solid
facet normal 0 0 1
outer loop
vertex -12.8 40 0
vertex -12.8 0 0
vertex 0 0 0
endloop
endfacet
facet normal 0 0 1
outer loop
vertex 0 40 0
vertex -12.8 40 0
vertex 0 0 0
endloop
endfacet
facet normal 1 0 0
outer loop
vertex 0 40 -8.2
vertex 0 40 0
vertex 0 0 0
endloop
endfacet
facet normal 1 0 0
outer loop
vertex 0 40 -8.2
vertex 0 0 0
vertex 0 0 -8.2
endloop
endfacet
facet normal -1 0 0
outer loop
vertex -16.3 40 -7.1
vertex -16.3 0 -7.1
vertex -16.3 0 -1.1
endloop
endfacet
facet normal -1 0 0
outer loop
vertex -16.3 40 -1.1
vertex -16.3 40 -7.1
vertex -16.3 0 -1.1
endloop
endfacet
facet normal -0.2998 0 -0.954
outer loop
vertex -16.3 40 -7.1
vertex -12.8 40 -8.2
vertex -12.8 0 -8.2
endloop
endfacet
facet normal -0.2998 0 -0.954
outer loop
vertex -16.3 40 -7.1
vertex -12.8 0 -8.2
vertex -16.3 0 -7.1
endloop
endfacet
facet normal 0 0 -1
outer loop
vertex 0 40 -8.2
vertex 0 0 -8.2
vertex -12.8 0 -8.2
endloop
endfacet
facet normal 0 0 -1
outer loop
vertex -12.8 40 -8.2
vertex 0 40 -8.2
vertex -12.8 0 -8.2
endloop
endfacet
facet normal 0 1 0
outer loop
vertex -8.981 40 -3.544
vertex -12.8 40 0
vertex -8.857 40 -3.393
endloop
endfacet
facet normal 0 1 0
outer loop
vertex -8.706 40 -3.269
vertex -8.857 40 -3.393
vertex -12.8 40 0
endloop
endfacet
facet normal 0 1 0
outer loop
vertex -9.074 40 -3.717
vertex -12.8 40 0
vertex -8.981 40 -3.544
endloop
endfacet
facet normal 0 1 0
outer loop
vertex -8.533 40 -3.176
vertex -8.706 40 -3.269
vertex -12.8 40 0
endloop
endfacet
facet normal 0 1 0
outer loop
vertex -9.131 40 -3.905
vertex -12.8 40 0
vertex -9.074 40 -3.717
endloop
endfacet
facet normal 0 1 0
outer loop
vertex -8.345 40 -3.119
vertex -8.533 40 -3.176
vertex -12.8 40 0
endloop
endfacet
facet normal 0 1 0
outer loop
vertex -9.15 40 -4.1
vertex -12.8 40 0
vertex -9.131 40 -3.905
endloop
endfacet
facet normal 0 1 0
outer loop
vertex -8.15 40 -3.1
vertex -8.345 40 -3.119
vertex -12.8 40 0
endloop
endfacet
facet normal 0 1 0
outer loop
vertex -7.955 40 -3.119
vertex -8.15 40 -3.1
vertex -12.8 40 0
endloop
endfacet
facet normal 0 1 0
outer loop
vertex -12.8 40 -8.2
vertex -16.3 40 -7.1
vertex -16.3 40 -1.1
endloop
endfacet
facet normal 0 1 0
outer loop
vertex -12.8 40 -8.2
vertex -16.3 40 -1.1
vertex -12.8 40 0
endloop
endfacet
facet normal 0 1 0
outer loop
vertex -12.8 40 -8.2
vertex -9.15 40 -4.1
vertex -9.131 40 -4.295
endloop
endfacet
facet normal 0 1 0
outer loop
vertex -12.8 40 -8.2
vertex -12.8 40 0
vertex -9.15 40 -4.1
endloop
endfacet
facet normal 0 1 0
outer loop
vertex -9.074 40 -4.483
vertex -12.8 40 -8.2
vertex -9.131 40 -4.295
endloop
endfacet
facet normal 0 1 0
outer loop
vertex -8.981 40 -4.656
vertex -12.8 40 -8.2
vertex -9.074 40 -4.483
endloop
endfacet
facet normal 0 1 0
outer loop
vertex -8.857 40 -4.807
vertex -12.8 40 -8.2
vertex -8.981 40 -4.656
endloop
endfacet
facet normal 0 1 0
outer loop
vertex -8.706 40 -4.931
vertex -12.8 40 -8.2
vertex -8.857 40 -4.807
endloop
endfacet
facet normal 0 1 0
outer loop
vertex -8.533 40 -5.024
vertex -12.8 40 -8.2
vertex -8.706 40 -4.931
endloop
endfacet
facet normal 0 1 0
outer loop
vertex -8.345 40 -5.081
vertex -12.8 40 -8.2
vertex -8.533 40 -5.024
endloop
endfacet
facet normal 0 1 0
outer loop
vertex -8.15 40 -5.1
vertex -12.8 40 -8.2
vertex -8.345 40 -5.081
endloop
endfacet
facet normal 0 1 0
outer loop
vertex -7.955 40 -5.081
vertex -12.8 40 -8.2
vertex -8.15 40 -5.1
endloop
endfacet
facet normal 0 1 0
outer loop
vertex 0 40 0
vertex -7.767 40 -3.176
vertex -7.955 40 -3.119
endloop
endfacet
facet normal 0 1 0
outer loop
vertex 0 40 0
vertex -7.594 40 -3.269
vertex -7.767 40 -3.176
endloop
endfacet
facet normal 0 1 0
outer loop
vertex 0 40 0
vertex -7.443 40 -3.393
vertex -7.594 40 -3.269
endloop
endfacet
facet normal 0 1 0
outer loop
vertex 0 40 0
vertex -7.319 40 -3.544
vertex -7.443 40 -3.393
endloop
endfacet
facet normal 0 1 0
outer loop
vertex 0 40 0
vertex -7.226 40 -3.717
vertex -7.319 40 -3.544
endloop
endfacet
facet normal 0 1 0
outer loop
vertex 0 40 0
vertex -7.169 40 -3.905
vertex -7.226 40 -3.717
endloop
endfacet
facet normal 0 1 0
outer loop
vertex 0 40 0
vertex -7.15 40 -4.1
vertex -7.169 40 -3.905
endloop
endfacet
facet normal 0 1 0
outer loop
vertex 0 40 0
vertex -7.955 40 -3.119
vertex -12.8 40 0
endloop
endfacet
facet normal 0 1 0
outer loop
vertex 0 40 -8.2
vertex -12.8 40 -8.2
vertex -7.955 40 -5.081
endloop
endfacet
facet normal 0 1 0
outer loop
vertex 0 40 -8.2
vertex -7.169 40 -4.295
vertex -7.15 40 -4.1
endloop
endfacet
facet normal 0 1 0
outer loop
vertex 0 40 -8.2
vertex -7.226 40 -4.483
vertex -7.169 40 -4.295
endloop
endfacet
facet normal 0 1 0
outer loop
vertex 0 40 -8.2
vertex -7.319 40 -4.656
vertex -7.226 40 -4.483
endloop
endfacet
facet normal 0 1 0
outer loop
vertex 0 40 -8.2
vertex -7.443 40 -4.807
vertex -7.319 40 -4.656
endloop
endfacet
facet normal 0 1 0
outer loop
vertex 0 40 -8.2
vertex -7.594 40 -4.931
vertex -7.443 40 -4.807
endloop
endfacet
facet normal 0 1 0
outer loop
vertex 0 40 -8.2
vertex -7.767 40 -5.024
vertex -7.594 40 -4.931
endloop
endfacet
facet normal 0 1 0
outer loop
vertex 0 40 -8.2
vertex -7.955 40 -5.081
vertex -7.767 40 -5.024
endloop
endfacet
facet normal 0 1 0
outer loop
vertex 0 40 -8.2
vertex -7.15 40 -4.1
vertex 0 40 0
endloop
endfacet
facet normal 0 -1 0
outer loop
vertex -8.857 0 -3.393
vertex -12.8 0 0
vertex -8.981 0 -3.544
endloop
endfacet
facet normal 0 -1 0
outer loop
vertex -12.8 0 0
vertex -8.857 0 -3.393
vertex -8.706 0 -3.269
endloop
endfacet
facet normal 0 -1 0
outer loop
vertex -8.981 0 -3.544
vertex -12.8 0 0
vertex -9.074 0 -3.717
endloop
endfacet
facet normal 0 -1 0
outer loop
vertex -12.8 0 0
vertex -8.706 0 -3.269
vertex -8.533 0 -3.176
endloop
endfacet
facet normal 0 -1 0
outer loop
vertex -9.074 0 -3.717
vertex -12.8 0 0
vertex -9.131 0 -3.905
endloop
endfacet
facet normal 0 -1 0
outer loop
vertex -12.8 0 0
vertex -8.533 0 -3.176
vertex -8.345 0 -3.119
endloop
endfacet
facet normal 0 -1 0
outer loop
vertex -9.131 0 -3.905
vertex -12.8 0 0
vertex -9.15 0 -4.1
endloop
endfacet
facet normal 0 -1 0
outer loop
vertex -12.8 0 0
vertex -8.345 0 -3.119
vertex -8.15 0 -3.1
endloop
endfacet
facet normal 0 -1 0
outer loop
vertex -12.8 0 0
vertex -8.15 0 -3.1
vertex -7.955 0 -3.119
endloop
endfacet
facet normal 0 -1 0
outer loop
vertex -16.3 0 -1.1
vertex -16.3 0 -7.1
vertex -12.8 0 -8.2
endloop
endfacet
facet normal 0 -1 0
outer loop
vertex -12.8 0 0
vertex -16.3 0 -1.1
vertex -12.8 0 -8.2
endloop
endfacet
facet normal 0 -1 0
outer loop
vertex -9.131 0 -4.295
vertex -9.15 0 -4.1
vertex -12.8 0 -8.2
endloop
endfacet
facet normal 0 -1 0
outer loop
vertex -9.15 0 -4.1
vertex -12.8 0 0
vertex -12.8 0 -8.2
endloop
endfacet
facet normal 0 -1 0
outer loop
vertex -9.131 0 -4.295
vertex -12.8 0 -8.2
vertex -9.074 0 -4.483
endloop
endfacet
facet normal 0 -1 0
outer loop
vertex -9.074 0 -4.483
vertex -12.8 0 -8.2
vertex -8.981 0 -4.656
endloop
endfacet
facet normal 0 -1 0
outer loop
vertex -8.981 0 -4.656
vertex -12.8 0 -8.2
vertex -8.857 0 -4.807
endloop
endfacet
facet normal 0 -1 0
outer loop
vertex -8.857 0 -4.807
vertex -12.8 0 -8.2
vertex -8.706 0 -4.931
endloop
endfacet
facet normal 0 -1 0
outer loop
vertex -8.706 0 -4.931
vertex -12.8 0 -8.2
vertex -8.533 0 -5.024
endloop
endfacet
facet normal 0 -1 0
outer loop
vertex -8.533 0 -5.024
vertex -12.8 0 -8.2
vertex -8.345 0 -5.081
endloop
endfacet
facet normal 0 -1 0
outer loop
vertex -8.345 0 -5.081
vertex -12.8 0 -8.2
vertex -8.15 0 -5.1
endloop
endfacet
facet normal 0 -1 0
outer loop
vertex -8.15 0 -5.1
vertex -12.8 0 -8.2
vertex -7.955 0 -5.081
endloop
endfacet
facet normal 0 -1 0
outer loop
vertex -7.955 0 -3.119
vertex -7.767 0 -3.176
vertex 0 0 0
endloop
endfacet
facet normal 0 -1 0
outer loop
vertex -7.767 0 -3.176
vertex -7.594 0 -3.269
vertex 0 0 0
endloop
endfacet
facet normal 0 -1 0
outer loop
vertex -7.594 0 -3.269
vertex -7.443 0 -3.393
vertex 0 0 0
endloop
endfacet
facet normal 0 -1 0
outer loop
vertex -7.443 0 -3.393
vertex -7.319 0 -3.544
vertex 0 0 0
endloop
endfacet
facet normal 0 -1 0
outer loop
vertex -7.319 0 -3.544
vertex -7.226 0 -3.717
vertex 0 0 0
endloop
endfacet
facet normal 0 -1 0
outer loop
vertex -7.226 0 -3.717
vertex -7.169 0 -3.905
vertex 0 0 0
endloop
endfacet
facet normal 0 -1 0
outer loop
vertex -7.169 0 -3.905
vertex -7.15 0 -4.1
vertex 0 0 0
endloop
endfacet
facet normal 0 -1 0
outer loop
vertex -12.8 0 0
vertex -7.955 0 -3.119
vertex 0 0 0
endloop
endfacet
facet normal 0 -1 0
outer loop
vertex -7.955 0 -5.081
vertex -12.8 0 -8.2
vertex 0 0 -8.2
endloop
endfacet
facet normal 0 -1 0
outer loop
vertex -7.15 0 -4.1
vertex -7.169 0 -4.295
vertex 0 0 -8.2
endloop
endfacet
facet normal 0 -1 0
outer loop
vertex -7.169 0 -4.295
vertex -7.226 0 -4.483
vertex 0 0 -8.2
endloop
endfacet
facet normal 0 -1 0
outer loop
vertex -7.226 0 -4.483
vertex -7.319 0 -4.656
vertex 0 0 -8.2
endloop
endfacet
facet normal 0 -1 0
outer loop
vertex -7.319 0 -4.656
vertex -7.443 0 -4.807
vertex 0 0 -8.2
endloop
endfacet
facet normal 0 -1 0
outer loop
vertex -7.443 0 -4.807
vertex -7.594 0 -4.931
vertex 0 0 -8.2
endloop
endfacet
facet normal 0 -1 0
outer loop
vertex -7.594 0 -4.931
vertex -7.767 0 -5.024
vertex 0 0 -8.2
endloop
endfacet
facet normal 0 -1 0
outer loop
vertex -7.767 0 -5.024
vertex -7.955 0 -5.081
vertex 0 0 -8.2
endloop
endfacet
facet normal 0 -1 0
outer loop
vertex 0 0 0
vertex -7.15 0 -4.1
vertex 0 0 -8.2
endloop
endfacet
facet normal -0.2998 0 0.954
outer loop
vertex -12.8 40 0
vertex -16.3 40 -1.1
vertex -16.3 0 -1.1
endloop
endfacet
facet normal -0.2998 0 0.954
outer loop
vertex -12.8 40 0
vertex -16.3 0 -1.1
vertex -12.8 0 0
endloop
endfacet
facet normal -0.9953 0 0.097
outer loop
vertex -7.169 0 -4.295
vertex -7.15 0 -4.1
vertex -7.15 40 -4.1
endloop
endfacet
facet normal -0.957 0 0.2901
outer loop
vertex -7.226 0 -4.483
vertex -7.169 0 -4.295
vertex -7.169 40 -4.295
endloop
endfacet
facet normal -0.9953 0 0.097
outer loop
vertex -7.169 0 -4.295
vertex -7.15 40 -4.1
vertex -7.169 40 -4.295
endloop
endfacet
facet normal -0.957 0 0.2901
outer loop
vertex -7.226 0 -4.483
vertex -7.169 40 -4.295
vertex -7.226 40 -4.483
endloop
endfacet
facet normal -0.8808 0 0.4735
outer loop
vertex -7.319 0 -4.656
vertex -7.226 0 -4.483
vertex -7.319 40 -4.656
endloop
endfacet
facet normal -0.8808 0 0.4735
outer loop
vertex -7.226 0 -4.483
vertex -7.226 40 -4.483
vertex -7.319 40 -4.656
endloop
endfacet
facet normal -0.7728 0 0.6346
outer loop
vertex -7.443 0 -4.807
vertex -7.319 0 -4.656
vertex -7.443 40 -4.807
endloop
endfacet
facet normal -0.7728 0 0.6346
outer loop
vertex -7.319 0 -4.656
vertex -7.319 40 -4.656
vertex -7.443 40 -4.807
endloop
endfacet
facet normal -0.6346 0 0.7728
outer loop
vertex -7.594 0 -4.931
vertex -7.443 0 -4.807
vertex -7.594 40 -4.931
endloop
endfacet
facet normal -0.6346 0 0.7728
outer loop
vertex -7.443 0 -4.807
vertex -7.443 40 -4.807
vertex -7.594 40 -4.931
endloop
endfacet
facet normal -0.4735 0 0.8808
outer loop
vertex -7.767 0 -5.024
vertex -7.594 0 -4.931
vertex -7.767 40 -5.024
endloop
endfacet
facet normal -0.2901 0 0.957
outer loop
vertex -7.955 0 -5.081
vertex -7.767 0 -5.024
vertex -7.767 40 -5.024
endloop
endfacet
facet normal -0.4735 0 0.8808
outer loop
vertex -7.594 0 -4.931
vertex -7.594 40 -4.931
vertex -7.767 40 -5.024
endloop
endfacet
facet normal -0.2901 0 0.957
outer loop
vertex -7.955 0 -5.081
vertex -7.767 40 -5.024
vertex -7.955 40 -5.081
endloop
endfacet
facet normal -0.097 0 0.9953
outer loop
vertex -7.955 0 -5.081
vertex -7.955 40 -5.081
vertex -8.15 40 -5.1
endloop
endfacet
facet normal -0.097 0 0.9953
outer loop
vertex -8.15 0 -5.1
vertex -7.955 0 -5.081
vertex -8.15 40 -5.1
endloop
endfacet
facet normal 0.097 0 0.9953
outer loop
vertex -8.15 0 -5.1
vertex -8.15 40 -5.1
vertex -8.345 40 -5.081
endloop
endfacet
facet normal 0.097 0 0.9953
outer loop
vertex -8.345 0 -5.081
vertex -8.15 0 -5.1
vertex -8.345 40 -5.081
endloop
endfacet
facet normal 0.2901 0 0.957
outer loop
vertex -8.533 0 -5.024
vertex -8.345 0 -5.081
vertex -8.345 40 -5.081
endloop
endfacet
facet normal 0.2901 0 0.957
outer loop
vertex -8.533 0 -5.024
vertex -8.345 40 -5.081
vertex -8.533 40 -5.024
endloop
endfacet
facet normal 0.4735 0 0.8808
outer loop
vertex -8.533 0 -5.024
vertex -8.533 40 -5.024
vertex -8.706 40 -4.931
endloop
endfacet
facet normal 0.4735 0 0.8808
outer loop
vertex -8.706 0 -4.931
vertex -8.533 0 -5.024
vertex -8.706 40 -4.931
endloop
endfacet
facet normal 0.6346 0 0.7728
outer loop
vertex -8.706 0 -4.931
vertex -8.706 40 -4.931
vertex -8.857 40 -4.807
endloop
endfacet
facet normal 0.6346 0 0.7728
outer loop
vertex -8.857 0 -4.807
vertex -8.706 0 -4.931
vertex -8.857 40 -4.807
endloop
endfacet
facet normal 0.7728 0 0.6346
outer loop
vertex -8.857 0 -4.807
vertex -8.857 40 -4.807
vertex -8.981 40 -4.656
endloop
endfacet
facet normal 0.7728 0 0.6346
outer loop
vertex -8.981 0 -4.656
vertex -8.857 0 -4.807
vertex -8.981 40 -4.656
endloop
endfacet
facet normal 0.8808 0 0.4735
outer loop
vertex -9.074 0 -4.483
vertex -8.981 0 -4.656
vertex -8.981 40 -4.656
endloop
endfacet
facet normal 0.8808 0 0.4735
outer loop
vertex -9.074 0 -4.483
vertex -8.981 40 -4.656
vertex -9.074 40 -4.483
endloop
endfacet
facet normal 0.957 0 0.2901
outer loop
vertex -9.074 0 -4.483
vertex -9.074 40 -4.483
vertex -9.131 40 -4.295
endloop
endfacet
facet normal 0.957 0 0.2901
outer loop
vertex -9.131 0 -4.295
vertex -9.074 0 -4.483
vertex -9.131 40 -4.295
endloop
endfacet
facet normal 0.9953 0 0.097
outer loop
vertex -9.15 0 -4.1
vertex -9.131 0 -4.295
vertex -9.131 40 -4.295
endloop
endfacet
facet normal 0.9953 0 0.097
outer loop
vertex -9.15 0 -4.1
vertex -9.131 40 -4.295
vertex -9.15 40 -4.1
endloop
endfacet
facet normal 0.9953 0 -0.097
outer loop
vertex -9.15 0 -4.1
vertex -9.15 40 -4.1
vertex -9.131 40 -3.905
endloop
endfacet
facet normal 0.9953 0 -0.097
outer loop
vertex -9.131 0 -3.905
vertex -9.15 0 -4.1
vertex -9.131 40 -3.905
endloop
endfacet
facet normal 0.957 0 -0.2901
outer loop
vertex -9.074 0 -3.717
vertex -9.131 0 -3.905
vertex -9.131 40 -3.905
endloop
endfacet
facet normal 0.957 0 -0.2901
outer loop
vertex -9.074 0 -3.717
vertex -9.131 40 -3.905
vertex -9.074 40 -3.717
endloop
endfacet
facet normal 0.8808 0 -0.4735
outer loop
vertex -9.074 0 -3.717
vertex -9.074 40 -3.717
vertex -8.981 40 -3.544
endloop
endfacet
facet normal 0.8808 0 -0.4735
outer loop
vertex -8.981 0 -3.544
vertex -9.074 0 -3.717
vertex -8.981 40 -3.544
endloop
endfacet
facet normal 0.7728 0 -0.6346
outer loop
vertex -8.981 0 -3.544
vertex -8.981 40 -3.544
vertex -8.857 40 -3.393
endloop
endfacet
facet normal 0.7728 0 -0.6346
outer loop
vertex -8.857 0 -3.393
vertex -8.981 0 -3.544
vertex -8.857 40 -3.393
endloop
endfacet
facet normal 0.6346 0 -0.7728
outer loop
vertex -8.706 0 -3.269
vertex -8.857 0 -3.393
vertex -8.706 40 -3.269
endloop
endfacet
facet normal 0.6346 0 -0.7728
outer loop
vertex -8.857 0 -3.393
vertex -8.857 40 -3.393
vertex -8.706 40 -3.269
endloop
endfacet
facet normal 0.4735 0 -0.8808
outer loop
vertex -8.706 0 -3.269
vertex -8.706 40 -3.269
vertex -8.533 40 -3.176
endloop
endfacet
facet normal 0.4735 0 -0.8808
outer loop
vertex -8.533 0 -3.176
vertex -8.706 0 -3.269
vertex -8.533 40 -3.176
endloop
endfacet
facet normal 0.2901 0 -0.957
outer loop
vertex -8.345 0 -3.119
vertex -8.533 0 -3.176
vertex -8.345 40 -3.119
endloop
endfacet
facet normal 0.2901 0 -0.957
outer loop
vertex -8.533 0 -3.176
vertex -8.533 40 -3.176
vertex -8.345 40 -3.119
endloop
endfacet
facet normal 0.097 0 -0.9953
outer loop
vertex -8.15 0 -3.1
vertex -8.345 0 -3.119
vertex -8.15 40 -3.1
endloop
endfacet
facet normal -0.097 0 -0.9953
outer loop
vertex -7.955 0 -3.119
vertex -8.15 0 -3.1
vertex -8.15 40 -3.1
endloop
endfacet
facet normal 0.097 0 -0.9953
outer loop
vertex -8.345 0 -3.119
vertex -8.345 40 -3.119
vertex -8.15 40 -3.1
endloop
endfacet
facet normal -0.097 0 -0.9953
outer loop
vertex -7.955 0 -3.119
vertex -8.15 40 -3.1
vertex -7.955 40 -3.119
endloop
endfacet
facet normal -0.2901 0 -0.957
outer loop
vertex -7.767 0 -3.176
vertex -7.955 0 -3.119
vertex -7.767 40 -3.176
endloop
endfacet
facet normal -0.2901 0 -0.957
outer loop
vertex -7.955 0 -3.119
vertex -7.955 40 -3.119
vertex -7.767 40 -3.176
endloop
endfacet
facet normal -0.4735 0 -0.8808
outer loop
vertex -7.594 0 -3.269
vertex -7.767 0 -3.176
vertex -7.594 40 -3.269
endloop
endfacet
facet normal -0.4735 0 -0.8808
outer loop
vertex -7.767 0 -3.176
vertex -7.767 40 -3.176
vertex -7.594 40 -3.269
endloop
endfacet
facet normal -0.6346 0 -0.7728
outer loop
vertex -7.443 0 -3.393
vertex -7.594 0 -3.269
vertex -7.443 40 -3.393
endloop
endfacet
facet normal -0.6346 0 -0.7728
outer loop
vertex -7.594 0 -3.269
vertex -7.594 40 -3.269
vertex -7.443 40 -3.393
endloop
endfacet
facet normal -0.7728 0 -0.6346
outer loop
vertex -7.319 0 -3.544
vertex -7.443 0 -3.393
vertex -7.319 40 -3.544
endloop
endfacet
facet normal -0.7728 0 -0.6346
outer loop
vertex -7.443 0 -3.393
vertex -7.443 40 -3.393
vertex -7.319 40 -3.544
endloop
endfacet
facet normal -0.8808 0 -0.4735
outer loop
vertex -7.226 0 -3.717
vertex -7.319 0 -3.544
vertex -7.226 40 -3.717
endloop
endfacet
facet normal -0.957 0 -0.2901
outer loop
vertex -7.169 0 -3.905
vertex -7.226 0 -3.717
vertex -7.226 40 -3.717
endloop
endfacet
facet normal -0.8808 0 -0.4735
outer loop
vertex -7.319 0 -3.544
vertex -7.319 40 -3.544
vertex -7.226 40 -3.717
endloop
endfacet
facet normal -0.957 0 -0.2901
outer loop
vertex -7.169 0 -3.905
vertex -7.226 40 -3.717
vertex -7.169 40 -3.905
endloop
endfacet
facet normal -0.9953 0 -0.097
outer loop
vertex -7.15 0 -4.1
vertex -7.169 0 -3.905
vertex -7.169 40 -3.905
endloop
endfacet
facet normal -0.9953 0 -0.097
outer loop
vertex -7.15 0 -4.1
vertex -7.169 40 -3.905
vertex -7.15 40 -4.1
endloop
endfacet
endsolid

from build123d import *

# Parameters (mm, degrees)
BOSS_EXTRUDE1_DEPTH = 40
CUT_EXTRUDE1_DEPTH  = 44.965099795


with BuildPart() as part:
    # Sketch1 → Boss-Extrude1 (new body)
    with BuildSketch(Plane(origin=(0, 0, 0), x_dir=(1, 0, 0), z_dir=(0, 1, 0))):
        Polygon((-16.3, 4.1), (0, 4.1), (0, 8.2), (-12.8, 8.2), (-16.3, 7.1), align=None)
        Polygon((-12.8, 0), (0, 0), (0, 4.1), (-16.3, 4.1), (-16.3, 1.1), align=None)
    extrude(amount=BOSS_EXTRUDE1_DEPTH)

    # Sketch2 → Cut-Extrude1 (cut, through all)
    with BuildSketch(Plane(origin=(0, 40, 0), x_dir=(1, 0, 0), z_dir=(0, 1, 0))):
        with BuildLine():
            ThreePointArc((-9.15, 4.1), (-8.15, 3.1), (-7.15, 4.1))
            Line((-7.15, 4.1), (-9.15, 4.1))
        make_face()
        with BuildLine():
            Line((-9.15, 4.1), (-7.15, 4.1))
            ThreePointArc((-7.15, 4.1), (-8.15, 5.1), (-9.15, 4.1))
        make_face()
    extrude(amount=-CUT_EXTRUDE1_DEPTH, mode=Mode.SUBTRACT)


solid = part.part
